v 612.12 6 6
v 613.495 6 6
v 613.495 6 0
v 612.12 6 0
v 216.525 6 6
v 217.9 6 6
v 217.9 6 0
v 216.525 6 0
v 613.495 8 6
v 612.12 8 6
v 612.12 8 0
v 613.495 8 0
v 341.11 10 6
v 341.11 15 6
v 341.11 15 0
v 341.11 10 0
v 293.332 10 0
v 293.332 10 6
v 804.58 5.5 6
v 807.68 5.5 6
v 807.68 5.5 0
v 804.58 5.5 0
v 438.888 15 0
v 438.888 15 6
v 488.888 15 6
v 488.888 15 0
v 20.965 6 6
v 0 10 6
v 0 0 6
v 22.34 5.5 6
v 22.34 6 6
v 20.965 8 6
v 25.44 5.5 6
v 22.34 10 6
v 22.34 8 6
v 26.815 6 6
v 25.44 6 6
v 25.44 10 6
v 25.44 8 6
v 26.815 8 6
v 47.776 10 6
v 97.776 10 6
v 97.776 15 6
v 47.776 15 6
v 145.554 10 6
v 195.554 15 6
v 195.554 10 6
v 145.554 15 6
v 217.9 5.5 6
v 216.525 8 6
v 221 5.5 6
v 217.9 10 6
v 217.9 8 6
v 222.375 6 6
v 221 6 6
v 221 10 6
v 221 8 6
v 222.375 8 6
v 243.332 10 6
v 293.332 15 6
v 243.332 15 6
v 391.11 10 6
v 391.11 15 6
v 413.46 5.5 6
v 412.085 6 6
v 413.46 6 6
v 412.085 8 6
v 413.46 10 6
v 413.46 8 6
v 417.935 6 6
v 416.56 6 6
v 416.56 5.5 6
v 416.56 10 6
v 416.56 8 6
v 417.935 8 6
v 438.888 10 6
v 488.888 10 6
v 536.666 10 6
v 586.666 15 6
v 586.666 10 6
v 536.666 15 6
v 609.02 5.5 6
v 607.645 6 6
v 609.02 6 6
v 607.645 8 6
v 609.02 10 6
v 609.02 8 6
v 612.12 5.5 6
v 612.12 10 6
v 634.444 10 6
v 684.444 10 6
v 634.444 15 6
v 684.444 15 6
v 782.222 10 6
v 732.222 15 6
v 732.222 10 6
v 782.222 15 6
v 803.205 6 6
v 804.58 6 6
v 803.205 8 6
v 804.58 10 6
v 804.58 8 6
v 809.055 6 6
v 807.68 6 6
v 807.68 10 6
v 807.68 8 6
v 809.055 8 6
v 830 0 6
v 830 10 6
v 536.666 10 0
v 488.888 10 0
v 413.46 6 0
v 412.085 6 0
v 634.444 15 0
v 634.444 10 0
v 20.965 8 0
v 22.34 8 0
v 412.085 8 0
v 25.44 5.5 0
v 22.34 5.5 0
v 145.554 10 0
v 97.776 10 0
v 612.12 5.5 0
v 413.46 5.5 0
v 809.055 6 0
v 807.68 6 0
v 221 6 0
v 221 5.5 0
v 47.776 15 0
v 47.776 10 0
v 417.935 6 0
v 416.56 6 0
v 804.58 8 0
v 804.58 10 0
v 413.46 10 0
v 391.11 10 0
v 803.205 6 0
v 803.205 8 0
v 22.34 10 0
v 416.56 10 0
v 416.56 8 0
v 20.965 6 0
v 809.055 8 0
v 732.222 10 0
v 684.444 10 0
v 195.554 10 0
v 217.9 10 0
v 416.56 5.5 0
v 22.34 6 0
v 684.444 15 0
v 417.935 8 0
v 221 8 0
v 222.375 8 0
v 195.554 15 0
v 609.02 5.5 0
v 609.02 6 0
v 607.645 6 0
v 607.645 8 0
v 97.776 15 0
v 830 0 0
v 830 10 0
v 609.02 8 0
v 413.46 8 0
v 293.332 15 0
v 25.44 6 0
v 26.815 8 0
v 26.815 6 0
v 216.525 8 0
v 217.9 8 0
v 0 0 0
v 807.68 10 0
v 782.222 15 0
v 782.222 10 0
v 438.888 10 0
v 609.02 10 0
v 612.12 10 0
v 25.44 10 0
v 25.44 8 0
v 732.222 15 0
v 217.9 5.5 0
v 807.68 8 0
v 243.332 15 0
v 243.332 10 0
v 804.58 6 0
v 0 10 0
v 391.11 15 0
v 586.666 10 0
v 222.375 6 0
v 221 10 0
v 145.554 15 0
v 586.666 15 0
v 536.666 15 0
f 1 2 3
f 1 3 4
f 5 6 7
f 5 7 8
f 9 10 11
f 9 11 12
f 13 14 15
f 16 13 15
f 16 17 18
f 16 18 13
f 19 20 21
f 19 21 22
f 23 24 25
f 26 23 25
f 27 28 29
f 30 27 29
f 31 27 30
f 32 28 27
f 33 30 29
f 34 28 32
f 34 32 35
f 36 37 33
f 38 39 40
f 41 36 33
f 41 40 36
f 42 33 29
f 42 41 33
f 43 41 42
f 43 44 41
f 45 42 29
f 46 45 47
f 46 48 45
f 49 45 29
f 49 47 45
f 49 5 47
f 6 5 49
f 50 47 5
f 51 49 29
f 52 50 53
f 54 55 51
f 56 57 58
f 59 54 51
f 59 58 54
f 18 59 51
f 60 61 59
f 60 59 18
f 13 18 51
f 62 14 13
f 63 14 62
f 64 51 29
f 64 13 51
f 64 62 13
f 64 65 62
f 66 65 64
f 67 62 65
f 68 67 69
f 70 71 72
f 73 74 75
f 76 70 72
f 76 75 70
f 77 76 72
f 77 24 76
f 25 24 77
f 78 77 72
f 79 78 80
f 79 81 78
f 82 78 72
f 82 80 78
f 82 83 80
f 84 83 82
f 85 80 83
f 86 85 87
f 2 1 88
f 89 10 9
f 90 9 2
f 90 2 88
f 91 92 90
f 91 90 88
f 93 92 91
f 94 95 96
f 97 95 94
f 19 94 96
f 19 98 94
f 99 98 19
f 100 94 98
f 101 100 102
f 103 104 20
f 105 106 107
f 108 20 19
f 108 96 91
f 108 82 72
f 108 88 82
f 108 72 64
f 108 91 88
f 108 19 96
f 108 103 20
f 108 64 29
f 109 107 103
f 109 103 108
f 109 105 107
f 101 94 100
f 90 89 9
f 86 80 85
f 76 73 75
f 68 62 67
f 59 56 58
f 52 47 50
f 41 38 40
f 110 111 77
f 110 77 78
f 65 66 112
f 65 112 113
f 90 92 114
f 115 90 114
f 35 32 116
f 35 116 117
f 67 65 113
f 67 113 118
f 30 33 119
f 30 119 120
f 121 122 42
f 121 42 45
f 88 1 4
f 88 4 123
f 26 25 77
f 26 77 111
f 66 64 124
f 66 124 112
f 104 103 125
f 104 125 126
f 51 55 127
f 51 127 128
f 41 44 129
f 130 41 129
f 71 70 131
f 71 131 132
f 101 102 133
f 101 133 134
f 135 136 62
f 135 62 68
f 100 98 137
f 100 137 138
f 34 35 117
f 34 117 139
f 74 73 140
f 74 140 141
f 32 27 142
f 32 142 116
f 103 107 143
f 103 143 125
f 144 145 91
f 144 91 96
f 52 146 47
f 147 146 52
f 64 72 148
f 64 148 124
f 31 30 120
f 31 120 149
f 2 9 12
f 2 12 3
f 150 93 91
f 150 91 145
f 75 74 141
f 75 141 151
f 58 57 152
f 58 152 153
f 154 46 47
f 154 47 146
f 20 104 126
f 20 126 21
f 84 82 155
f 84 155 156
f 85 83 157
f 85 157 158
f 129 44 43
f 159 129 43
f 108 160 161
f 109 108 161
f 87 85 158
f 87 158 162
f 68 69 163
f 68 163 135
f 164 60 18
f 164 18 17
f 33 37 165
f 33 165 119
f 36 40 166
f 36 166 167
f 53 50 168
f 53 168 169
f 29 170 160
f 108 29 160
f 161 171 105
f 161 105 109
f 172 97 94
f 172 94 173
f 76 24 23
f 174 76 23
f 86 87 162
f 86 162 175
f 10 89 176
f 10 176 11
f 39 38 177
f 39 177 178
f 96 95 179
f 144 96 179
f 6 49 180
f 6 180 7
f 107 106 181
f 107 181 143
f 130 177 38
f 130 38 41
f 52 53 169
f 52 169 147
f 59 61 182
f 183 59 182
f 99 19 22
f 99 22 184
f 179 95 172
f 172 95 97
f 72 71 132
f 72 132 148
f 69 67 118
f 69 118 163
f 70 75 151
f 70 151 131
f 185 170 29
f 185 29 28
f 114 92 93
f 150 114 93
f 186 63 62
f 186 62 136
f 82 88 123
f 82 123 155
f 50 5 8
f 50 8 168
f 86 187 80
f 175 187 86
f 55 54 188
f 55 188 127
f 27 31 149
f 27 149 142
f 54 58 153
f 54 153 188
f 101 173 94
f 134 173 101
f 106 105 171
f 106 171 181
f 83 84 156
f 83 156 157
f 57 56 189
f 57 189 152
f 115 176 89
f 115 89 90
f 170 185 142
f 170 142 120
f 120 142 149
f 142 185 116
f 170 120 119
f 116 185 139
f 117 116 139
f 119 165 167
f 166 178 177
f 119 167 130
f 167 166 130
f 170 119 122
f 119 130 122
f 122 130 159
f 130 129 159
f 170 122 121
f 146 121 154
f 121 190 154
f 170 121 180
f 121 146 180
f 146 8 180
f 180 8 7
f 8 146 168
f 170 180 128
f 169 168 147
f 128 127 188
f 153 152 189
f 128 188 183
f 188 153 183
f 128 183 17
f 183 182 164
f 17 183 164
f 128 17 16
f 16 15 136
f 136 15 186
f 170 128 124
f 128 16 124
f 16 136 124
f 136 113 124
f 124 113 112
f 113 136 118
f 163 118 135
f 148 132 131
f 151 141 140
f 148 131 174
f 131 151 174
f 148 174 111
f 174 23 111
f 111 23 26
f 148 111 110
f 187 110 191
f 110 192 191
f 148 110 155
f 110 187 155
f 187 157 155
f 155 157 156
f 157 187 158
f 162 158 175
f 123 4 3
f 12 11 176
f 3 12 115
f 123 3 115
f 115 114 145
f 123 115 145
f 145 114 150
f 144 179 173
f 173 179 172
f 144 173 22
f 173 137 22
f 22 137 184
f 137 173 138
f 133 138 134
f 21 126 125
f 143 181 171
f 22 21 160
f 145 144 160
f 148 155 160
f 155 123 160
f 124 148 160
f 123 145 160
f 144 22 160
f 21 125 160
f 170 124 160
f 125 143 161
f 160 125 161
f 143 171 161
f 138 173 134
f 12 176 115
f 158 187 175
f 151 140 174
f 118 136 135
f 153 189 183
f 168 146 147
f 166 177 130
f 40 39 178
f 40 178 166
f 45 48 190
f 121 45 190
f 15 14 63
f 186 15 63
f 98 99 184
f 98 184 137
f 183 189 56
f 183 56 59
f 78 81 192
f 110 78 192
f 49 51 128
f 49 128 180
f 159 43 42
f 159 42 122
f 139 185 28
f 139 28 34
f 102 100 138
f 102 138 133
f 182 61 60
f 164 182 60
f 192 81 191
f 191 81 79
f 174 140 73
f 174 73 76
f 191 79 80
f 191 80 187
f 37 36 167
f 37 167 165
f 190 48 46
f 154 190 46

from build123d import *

# Parameters (mm, degrees)
SZKIC1_W                    = 830
SZKIC1_H                    = 16
DODANIE_WYCI_GNI_CIE1_DEPTH = 6
SZKIC2_W                    = 47.778
SZKIC2_H                    = 6
WYTNIJ_WYCI_GNI_CIE1_DEPTH  = 6
SZYK_LINIOWY1_COUNT         = 9
SZYK_LINIOWY1_PITCH         = 97.778
WYTNIJ_WYCI_GNI_CIE2_DEPTH  = 6
SZYK_LINIOWY2_COUNT         = 5
SZYK_LINIOWY2_PITCH         = 195.56
SZKIC5_W                    = 734.446
SZKIC5_H                    = 1
WYTNIJ_WYCI_GNI_CIE3_DEPTH  = 10


with BuildPart() as part:
    # Szkic1 → Dodanie-wyciągnięcie1 (new body)
    with BuildSketch(Plane.XY):
        with Locations((415, 8)):
            Rectangle(SZKIC1_W, SZKIC1_H)
    extrude(amount=DODANIE_WYCI_GNI_CIE1_DEPTH)

    # Szkic2 → Wytnij-wyciągnięcie1 (cut)
    with BuildSketch(Plane(origin=(0, 16, 0), x_dir=(1, 0, 0), z_dir=(0, 1, 0))):
        with Locations((806.111, -3)):
            Rectangle(SZKIC2_W, SZKIC2_H)
    wytnij_wyci_gni_cie1 = extrude(amount=-WYTNIJ_WYCI_GNI_CIE1_DEPTH, mode=Mode.SUBTRACT)

    # Szyk liniowy1: Wytnij-wyciągnięcie1 ×9
    with Locations(*[(-i * SZYK_LINIOWY1_PITCH, 0, 0) for i in range(1, SZYK_LINIOWY1_COUNT)]):
        add(wytnij_wyci_gni_cie1, mode=Mode.SUBTRACT)

    # Szkic4 → Wytnij-wyciągnięcie2 (cut)
    with BuildSketch(Plane.XY.offset(6)):
        Polygon((22.34, 10), (25.44, 10), (25.44, 8), (26.815, 8), (26.815, 6), (25.44, 6), (25.44, 5.5), (22.34, 5.5), (22.34, 6), (20.965, 6), (20.965, 8), (22.34, 8), align=None)
    wytnij_wyci_gni_cie2 = extrude(amount=-WYTNIJ_WYCI_GNI_CIE2_DEPTH, mode=Mode.SUBTRACT)

    # Szyk liniowy2: Wytnij-wyciągnięcie2 ×5
    with Locations(*[(i * SZYK_LINIOWY2_PITCH, 0, 0) for i in range(1, SZYK_LINIOWY2_COUNT)]):
        add(wytnij_wyci_gni_cie2, mode=Mode.SUBTRACT)

    # Szkic5 → Wytnij-wyciągnięcie3 (cut)
    with BuildSketch(Plane.XY.offset(6)):
        with Locations((414.999, 15.5)):
            Rectangle(SZKIC5_W, SZKIC5_H)
    extrude(amount=-WYTNIJ_WYCI_GNI_CIE3_DEPTH, mode=Mode.SUBTRACT)


solid = part.part
